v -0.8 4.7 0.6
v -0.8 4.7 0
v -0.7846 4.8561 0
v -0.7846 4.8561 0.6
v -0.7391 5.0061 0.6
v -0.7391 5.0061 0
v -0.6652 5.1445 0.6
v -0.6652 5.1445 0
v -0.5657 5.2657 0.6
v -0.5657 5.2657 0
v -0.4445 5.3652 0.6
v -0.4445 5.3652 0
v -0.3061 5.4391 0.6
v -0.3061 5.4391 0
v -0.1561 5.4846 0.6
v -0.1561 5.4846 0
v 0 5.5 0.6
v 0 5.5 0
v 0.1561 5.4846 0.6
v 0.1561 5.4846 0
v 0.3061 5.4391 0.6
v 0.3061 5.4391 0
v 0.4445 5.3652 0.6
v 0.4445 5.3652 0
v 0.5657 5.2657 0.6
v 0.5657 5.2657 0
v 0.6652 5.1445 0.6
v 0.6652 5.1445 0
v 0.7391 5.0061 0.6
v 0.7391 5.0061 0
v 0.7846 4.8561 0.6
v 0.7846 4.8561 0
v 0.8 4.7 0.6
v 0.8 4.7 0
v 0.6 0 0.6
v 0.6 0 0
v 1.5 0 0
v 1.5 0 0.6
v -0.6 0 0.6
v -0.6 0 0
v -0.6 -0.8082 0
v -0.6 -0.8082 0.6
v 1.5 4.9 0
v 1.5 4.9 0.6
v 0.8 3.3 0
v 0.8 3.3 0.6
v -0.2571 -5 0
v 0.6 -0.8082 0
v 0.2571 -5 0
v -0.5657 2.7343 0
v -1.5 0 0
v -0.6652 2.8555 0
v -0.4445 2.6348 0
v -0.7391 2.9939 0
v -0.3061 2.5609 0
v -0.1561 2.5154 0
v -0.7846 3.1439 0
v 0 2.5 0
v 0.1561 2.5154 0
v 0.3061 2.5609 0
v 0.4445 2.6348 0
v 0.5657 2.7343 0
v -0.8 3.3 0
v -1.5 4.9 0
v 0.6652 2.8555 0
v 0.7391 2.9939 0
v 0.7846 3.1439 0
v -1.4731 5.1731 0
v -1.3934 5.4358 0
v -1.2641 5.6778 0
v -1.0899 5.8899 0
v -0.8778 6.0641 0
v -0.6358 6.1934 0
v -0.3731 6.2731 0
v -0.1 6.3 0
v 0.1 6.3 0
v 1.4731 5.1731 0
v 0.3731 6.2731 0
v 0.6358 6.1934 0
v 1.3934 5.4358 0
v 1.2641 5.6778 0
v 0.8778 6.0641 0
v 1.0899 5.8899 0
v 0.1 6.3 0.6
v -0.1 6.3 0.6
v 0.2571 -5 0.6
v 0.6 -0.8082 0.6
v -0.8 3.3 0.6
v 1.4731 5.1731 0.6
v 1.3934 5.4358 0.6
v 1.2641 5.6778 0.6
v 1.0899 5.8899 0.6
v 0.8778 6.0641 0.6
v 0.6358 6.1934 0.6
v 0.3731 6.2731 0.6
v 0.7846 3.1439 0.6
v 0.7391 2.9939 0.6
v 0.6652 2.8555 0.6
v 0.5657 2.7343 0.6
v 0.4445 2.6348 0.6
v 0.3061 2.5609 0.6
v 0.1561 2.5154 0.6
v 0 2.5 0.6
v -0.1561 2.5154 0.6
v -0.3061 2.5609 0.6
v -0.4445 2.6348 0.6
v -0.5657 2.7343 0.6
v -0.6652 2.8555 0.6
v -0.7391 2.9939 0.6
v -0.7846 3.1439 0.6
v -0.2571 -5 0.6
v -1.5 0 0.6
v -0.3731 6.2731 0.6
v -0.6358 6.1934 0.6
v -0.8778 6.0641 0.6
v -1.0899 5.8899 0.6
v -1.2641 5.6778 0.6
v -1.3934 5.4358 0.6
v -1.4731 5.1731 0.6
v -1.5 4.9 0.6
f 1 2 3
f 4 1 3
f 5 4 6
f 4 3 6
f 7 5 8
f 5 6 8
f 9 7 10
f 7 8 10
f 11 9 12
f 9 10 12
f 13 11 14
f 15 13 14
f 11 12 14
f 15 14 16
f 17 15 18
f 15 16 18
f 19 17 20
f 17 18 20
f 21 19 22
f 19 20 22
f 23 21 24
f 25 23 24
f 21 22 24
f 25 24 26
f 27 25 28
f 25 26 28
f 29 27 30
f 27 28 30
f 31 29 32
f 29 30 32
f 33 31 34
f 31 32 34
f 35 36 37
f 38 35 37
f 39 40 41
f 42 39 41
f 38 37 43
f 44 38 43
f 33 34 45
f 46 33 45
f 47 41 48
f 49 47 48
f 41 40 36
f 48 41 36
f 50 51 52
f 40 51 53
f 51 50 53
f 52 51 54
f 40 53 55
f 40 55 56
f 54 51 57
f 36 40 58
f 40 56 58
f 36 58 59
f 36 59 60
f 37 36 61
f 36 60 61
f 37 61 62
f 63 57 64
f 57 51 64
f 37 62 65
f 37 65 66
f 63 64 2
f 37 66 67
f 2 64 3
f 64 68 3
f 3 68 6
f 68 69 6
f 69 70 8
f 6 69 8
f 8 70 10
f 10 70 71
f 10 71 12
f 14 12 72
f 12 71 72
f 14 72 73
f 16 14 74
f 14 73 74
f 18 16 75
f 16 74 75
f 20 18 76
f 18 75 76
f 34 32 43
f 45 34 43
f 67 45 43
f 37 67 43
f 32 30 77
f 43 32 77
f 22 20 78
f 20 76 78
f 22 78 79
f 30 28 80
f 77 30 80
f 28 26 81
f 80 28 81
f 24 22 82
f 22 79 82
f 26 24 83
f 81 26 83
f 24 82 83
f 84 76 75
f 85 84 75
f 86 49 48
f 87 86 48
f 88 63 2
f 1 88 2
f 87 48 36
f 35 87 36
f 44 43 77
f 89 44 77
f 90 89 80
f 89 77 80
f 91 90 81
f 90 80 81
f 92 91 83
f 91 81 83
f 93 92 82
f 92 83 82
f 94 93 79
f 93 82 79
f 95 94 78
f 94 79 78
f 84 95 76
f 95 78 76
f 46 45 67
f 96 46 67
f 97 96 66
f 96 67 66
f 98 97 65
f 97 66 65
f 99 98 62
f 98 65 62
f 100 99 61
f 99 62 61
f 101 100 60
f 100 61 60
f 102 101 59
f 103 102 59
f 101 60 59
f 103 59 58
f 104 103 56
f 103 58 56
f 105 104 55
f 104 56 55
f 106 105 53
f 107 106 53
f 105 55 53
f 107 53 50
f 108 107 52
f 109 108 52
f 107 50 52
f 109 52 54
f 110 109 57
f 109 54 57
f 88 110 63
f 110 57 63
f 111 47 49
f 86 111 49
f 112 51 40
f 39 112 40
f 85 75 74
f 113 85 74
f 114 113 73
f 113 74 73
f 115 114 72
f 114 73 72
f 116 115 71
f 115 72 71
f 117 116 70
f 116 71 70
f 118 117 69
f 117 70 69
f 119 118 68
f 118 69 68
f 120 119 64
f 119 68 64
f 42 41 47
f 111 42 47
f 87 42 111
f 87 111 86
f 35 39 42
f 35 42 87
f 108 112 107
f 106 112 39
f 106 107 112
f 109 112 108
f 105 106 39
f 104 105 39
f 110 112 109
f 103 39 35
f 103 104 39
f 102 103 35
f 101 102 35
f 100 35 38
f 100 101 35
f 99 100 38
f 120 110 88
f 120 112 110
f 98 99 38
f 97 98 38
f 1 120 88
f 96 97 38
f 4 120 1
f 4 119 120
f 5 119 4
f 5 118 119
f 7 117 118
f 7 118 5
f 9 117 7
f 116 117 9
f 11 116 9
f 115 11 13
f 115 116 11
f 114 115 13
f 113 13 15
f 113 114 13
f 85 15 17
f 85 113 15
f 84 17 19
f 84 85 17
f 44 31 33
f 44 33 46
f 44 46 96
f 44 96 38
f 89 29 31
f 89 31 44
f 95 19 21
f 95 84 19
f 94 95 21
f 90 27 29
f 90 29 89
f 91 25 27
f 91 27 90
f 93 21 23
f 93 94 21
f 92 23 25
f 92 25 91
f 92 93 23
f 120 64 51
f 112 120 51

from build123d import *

# Parameters (mm, degrees)
ESTRUSIONE_ESTRUSIONE1_DEPTH = 0.6


with BuildPart() as part:
    # Schizzo1 → Estrusione-Estrusione1 (new body)
    with BuildSketch(Plane.XY):
        with BuildLine():
            Line((-1.5, 0), (-0.6, 0))
            Line((-0.6, 0), (-0.6, -0.808174013))
            Line((-0.6, -0.808174013), (-0.257137319, -5))
            Line((-0.257137319, -5), (0.257137319, -5))
            Line((0.257137319, -5), (0.6, -0.808174013))
            Line((0.6, -0.808174013), (0.6, 0))
            Line((0.6, 0), (1.5, 0))
            Line((1.5, 0), (1.5, 4.9))
            ThreePointArc((1.5, 4.9), (1.089949494, 5.889949494), (0.1, 6.3))
            Line((0.1, 6.3), (-0.1, 6.3))
            ThreePointArc((-0.1, 6.3), (-1.089949494, 5.889949494), (-1.5, 4.9))
            Line((-1.5, 4.9), (-1.5, 0))
        make_face()
        with BuildLine():
            Line((0.8, 4.7), (0.8, 3.3))
            ThreePointArc((0.8, 3.3), (0, 2.5), (-0.8, 3.3))
            Line((-0.8, 3.3), (-0.8, 4.7))
            ThreePointArc((-0.8, 4.7), (0, 5.5), (0.8, 4.7))
        make_face(mode=Mode.SUBTRACT)
    extrude(amount=ESTRUSIONE_ESTRUSIONE1_DEPTH)


solid = part.part
